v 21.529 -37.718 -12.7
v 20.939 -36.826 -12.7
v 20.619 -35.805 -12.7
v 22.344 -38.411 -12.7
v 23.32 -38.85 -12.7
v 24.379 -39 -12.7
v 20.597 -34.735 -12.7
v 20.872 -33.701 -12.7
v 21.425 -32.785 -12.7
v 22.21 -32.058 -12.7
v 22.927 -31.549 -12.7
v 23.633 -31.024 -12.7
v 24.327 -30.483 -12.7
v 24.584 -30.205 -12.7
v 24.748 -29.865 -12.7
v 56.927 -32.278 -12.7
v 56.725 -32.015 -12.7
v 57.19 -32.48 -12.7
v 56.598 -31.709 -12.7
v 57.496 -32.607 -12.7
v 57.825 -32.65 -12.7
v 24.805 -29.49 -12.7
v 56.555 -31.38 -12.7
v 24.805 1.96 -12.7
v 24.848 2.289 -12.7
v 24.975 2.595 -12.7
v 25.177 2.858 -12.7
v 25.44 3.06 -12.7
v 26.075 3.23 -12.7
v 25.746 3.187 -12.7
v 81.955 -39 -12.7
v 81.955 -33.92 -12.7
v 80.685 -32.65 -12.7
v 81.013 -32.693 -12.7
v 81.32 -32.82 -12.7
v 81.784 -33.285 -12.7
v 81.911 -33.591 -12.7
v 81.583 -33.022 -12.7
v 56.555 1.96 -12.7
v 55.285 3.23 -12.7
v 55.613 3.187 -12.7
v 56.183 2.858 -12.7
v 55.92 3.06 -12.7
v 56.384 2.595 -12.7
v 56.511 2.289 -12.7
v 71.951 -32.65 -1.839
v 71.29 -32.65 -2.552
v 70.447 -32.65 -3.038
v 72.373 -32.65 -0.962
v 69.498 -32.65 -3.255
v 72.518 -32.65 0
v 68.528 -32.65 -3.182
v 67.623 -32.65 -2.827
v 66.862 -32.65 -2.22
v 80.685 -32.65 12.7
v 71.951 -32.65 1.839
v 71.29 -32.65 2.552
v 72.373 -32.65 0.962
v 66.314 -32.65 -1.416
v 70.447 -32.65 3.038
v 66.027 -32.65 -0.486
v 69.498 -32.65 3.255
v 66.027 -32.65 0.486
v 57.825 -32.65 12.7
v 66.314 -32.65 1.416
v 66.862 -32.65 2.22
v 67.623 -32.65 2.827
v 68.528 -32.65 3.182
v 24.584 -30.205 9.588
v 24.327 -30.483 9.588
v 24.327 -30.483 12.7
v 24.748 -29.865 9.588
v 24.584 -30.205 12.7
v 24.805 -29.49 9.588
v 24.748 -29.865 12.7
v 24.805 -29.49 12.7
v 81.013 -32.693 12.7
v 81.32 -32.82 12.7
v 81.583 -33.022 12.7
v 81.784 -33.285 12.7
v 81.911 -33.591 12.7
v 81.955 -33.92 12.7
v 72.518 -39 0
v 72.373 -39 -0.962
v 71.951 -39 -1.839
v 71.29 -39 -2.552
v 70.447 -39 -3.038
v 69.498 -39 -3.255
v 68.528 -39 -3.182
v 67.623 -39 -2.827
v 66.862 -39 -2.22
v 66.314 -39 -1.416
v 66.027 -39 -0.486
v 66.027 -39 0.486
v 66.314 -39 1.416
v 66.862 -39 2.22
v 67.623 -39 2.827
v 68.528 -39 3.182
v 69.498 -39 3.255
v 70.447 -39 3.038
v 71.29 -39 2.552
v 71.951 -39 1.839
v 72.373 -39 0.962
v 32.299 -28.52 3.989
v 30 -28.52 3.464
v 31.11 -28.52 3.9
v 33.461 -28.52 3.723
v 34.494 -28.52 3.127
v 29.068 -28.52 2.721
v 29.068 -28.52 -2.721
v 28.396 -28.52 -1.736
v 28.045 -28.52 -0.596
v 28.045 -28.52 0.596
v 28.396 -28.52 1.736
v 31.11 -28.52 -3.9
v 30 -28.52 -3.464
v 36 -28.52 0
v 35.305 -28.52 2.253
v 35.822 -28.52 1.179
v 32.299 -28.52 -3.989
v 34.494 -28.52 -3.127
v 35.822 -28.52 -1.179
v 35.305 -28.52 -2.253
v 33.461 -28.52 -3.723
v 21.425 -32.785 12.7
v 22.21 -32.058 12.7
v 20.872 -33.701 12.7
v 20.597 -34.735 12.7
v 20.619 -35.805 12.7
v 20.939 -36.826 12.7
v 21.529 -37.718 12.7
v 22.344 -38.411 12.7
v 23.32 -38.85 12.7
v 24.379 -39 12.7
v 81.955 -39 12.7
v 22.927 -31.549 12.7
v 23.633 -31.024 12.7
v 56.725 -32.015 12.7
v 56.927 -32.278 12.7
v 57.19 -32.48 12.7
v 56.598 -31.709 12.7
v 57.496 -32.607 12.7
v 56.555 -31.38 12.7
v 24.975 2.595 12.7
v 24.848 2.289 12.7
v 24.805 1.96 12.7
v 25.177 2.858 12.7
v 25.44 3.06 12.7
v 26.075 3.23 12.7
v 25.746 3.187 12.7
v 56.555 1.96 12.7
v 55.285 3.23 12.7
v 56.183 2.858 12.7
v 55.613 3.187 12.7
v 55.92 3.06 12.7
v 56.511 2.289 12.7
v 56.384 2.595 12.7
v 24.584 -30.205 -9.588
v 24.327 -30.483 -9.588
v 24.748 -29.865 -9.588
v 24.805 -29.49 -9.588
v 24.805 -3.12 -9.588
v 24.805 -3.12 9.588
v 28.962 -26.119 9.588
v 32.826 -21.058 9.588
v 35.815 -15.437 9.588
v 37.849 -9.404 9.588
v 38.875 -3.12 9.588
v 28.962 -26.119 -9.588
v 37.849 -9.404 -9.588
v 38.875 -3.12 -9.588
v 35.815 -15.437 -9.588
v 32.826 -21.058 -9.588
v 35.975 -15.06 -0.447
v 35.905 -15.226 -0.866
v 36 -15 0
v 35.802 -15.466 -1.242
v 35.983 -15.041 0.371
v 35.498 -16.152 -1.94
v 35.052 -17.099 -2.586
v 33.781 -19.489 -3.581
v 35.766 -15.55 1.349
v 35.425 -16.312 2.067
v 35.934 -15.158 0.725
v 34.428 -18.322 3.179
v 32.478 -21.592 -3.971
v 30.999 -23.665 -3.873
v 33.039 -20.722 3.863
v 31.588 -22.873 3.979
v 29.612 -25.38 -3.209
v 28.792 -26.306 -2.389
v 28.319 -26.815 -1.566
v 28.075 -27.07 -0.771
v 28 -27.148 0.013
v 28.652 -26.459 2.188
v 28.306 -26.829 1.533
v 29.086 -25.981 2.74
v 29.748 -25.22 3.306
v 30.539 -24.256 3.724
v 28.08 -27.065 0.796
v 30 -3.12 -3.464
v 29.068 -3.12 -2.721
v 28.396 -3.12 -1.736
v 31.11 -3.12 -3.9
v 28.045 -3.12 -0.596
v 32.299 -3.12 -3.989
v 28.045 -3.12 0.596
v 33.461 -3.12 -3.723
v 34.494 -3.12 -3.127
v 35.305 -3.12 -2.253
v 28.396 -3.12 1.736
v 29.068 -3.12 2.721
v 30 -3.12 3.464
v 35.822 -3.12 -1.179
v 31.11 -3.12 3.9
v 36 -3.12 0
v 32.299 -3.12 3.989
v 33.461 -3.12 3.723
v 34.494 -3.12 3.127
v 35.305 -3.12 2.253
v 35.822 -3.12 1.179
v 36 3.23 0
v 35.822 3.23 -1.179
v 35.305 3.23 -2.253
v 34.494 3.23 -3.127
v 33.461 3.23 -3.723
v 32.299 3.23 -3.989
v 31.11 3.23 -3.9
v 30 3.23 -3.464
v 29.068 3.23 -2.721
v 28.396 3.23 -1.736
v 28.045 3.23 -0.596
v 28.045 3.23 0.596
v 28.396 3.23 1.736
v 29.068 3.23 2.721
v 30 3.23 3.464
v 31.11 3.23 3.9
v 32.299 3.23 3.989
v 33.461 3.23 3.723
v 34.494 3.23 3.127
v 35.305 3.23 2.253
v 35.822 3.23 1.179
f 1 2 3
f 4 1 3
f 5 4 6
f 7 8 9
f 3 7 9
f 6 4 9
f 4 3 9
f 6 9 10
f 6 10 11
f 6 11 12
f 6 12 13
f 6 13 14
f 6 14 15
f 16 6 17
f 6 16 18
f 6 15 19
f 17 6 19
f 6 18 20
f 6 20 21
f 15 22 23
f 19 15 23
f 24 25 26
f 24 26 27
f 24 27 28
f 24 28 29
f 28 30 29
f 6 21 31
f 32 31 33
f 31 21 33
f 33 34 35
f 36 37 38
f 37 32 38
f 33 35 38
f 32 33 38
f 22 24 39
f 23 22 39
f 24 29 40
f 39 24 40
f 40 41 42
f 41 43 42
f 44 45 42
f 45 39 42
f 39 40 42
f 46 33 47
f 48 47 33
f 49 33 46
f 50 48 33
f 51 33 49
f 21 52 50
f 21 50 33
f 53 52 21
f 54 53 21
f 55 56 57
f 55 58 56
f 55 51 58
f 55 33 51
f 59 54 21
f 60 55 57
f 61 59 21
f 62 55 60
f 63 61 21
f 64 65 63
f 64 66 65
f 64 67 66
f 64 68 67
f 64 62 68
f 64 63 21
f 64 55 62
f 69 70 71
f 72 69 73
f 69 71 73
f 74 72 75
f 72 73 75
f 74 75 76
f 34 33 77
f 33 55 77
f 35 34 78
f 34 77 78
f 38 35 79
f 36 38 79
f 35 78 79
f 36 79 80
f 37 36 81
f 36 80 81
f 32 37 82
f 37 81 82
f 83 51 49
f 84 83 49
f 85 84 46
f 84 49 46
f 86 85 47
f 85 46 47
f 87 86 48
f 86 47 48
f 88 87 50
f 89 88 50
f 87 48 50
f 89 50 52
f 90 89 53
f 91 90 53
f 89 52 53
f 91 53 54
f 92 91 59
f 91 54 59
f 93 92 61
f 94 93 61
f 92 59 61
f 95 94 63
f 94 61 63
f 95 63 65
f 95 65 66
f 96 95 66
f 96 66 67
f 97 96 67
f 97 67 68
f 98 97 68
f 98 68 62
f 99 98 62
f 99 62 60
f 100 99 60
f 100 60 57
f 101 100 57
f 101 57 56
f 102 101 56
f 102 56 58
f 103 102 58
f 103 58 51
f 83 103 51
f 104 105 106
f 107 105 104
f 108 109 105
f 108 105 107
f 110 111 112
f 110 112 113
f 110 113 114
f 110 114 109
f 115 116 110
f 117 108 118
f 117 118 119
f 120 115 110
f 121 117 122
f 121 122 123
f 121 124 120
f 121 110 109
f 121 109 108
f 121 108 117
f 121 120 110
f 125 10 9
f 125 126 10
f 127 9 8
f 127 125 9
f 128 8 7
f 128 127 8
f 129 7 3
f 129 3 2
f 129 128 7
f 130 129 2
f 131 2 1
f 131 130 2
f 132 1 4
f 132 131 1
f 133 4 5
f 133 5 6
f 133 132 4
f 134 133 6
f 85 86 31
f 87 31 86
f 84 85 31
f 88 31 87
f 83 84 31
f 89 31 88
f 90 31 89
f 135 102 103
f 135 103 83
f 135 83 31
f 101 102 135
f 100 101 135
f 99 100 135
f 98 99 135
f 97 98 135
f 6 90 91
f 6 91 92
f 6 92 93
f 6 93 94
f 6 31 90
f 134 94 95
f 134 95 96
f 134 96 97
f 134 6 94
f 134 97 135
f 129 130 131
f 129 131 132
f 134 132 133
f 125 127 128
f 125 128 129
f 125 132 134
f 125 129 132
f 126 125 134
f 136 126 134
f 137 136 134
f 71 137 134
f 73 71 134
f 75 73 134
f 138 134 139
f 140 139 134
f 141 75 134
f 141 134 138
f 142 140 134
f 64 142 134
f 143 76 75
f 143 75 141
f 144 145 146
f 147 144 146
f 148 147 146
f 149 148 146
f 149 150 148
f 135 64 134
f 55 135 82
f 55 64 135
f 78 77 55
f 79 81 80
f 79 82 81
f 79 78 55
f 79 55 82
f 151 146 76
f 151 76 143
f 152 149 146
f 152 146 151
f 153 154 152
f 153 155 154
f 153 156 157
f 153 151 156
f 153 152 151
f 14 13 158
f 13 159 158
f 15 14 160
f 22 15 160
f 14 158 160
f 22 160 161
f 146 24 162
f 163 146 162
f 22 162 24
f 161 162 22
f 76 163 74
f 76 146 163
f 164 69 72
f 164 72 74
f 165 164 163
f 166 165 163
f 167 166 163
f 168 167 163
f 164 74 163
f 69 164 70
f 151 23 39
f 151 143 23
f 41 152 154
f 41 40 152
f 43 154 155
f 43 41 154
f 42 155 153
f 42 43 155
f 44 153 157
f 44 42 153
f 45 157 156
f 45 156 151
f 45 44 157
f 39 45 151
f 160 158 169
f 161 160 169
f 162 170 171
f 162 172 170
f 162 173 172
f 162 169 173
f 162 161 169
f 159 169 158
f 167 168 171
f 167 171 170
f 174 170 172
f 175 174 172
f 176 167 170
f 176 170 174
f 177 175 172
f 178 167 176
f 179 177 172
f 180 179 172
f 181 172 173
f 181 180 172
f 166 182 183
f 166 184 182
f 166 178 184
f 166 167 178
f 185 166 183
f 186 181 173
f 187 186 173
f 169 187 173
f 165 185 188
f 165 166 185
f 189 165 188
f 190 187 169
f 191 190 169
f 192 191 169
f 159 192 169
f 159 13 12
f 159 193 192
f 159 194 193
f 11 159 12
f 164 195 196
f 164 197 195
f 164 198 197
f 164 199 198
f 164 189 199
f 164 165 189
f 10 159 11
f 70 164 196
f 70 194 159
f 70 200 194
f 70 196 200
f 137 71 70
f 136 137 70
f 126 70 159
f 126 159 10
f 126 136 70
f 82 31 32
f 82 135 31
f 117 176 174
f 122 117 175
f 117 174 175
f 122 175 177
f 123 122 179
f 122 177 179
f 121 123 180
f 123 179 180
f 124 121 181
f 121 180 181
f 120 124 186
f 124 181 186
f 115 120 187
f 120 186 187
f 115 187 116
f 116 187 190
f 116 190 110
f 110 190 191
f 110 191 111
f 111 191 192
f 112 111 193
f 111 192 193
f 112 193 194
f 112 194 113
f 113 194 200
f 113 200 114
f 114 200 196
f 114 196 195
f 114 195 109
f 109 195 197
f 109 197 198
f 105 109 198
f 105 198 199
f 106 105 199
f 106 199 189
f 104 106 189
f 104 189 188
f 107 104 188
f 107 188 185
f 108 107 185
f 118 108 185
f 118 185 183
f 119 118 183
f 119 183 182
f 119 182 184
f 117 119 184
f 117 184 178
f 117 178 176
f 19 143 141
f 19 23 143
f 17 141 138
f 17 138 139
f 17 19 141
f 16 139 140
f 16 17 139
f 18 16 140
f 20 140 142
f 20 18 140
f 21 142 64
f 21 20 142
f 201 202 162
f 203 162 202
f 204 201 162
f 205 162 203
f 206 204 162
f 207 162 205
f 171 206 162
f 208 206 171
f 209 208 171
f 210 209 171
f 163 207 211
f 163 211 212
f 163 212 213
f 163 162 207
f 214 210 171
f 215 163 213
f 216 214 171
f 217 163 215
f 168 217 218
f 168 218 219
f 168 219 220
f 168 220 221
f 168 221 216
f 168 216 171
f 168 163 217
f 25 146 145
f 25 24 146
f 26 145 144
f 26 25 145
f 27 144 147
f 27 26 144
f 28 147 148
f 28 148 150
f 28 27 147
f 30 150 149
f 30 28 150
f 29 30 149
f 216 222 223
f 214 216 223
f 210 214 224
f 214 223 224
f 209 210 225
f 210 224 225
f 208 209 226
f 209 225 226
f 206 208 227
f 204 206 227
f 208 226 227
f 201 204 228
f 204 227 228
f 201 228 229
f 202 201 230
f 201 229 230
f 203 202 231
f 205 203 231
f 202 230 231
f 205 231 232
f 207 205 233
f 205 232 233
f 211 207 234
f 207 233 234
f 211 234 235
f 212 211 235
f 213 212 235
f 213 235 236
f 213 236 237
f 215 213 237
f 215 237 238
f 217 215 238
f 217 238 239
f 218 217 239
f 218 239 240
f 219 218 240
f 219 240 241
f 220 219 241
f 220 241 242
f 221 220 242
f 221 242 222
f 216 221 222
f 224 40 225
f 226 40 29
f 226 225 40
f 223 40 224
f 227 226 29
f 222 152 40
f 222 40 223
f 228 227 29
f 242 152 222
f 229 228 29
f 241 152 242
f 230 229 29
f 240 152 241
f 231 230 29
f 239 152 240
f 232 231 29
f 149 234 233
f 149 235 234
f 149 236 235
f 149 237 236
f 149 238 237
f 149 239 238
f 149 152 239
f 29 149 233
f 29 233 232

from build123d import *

# Parameters (mm, degrees)
BOSS_EXTRUDE1_DEPTH     = 12.7
SKETCH2_R               = 3.2639
CUT_EXTRUDE1_DEPTH      = 4.23
CUT_EXTRUDE1_DEPTH_BACK = 40
SKETCH3_R               = 4
CUT_EXTRUDE2_DEPTH      = 31.75
SKETCH4_W               = 3.1115
SKETCH4_H               = 42.23
BOSS_EXTRUDE2_DEPTH     = 31.75
FILLET4_R               = 1.27


with BuildPart() as part:
    # Sketch1 → Boss-Extrude1 (new body, symmetric)
    with BuildSketch(Plane.XY):
        with BuildLine():
            Line((81.95454797, -39), (81.95454797, -32.65))
            Line((81.95454797, -32.65), (56.55454797, -32.65))
            Line((56.55454797, -32.65), (56.55454797, 3.23))
            Line((56.55454797, 3.23), (24.80454797, 3.23))
            Line((24.80454797, 3.23), (24.80454797, -3.12))
            Line((24.80454797, -3.12), (38.874999678, -3.12))
            ThreePointArc((38.874999678, -3.12), (33.796327751, -19.462996443), (22.209775375, -32.05816398))
            ThreePointArc((22.209775375, -32.05816398), (20.742990597, -36.326618838), (24.379499585, -39))
            Line((24.379499585, -39), (81.95454797, -39))
        make_face()
    extrude(amount=BOSS_EXTRUDE1_DEPTH, both=True)

    # Sketch2 → Cut-Extrude1 (cut, two sides)
    with BuildSketch(Plane(origin=(0, 0, 0), x_dir=(1, 0, 0), z_dir=(0, 1, 0))) as cut_extrude1_sk:
        with Locations((69.25454797, 0)):
            Circle(SKETCH2_R)
    extrude(amount=CUT_EXTRUDE1_DEPTH, mode=Mode.SUBTRACT)
    extrude(cut_extrude1_sk.sketch, amount=-CUT_EXTRUDE1_DEPTH_BACK, mode=Mode.SUBTRACT)

    # Sketch3 → Cut-Extrude2 (cut)
    with BuildSketch(Plane(origin=(0, 3.23, 0), x_dir=(1, 0, 0), z_dir=(0, 1, 0))):
        with Locations((32, 0)):
            Circle(SKETCH3_R)
    extrude(amount=-CUT_EXTRUDE2_DEPTH, mode=Mode.SUBTRACT)

    # Sketch4 → Boss-Extrude2 (add)
    with BuildSketch(Plane.ZY.offset(-24.80454797)):
        with Locations((-11.14425, -17.885)):
            Rectangle(SKETCH4_W, SKETCH4_H)
        with Locations((11.14425, -17.885)):
            Rectangle(SKETCH4_W, SKETCH4_H)
    extrude(amount=-BOSS_EXTRUDE2_DEPTH)

    # Fillet4
    fillet4_edges = [part.edges().sort_by_distance(p)[0] for p in [
        (24.80454797, 3.23, 0),
        (56.55454797, 3.23, 0),
        (56.55454797, -32.65, 0),
        (81.95454797, -32.65, 0),
        (24.80454797, -30.095421579, -11.14425),
        (24.80454797, -30.095421579, 11.14425),
    ]]
    fillet(fillet4_edges, radius=FILLET4_R)


solid = part.part
